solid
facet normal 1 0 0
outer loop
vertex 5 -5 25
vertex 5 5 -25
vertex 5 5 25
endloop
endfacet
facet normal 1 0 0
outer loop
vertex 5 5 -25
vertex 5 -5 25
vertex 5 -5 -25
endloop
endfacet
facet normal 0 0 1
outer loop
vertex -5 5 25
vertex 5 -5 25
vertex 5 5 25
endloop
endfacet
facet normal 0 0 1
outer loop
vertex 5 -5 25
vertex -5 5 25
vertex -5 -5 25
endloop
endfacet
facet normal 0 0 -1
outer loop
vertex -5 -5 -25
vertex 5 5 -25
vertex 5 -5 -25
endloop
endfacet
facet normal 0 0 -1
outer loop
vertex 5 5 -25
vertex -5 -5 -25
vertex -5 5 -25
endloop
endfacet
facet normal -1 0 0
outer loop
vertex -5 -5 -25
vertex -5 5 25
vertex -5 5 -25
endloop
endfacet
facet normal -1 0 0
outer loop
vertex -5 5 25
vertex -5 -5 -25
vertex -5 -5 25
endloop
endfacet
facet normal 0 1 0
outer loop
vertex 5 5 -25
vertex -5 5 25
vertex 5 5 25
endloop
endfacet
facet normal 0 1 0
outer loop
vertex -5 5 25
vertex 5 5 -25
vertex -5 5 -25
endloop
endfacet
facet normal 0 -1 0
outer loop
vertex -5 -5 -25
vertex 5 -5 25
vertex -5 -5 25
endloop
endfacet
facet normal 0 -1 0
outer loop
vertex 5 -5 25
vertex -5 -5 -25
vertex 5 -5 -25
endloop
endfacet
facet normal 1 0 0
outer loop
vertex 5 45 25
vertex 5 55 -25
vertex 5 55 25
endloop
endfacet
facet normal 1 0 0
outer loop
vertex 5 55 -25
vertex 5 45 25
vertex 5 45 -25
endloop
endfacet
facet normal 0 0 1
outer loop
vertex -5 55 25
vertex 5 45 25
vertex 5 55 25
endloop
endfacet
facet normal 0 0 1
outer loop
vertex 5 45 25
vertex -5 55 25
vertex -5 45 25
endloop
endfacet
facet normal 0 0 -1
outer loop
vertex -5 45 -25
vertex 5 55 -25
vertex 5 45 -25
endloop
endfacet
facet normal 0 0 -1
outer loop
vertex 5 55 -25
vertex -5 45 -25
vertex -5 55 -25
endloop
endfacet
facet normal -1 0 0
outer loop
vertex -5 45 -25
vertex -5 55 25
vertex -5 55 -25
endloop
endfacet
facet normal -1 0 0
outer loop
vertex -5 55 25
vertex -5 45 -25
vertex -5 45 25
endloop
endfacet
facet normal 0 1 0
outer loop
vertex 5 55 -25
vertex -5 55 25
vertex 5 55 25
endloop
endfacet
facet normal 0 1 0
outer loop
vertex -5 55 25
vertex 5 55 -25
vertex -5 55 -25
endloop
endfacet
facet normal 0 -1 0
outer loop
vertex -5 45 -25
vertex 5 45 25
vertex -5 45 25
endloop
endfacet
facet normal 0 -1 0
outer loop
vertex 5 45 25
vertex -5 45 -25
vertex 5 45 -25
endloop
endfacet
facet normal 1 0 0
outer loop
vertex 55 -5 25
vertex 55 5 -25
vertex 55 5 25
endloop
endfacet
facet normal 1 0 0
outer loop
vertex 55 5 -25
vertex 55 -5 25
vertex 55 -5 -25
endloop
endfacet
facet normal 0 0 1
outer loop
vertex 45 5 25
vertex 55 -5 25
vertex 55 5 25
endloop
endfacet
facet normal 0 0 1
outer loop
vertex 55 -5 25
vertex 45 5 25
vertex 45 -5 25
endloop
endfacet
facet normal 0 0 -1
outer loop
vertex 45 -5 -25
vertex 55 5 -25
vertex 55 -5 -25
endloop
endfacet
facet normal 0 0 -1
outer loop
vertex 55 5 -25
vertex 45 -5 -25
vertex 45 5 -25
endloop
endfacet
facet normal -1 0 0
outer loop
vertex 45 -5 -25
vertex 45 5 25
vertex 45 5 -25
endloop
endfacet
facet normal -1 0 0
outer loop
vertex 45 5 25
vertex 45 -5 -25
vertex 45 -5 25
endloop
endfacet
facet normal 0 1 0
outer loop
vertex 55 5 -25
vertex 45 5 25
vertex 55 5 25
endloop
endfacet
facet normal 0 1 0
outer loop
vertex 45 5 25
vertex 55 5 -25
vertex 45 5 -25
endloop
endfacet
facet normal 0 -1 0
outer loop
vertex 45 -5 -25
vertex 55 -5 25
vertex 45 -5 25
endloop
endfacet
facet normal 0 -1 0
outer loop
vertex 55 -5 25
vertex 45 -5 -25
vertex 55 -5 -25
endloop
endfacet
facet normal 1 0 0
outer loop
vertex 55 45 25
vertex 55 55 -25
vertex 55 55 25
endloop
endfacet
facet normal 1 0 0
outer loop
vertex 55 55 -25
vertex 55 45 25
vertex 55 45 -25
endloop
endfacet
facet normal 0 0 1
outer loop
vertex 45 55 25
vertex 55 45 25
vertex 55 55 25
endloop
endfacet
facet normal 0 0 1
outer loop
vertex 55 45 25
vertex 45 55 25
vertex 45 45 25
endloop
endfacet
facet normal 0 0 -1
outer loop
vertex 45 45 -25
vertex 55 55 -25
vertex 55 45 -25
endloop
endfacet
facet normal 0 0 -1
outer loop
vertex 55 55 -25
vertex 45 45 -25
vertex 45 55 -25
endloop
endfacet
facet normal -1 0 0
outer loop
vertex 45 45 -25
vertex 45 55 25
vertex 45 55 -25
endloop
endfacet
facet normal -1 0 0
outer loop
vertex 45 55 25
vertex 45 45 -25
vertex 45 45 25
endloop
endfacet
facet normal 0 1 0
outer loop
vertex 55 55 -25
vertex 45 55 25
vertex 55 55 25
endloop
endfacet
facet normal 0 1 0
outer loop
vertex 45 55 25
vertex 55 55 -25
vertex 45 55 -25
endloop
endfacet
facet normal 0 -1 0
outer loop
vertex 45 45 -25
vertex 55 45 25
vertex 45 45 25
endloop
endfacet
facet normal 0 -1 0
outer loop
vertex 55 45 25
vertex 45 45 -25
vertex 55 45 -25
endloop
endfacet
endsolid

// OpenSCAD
module leg(x=10, y=10, z=50) {
    cube([x, y, z], center=true);
}

module top_shelf() {
}

module mid_shelf() {
}

leg();
translate([0,50,0])
    leg();
translate([50,0,0])
    leg();
translate([50,50,0])
    leg();
    
